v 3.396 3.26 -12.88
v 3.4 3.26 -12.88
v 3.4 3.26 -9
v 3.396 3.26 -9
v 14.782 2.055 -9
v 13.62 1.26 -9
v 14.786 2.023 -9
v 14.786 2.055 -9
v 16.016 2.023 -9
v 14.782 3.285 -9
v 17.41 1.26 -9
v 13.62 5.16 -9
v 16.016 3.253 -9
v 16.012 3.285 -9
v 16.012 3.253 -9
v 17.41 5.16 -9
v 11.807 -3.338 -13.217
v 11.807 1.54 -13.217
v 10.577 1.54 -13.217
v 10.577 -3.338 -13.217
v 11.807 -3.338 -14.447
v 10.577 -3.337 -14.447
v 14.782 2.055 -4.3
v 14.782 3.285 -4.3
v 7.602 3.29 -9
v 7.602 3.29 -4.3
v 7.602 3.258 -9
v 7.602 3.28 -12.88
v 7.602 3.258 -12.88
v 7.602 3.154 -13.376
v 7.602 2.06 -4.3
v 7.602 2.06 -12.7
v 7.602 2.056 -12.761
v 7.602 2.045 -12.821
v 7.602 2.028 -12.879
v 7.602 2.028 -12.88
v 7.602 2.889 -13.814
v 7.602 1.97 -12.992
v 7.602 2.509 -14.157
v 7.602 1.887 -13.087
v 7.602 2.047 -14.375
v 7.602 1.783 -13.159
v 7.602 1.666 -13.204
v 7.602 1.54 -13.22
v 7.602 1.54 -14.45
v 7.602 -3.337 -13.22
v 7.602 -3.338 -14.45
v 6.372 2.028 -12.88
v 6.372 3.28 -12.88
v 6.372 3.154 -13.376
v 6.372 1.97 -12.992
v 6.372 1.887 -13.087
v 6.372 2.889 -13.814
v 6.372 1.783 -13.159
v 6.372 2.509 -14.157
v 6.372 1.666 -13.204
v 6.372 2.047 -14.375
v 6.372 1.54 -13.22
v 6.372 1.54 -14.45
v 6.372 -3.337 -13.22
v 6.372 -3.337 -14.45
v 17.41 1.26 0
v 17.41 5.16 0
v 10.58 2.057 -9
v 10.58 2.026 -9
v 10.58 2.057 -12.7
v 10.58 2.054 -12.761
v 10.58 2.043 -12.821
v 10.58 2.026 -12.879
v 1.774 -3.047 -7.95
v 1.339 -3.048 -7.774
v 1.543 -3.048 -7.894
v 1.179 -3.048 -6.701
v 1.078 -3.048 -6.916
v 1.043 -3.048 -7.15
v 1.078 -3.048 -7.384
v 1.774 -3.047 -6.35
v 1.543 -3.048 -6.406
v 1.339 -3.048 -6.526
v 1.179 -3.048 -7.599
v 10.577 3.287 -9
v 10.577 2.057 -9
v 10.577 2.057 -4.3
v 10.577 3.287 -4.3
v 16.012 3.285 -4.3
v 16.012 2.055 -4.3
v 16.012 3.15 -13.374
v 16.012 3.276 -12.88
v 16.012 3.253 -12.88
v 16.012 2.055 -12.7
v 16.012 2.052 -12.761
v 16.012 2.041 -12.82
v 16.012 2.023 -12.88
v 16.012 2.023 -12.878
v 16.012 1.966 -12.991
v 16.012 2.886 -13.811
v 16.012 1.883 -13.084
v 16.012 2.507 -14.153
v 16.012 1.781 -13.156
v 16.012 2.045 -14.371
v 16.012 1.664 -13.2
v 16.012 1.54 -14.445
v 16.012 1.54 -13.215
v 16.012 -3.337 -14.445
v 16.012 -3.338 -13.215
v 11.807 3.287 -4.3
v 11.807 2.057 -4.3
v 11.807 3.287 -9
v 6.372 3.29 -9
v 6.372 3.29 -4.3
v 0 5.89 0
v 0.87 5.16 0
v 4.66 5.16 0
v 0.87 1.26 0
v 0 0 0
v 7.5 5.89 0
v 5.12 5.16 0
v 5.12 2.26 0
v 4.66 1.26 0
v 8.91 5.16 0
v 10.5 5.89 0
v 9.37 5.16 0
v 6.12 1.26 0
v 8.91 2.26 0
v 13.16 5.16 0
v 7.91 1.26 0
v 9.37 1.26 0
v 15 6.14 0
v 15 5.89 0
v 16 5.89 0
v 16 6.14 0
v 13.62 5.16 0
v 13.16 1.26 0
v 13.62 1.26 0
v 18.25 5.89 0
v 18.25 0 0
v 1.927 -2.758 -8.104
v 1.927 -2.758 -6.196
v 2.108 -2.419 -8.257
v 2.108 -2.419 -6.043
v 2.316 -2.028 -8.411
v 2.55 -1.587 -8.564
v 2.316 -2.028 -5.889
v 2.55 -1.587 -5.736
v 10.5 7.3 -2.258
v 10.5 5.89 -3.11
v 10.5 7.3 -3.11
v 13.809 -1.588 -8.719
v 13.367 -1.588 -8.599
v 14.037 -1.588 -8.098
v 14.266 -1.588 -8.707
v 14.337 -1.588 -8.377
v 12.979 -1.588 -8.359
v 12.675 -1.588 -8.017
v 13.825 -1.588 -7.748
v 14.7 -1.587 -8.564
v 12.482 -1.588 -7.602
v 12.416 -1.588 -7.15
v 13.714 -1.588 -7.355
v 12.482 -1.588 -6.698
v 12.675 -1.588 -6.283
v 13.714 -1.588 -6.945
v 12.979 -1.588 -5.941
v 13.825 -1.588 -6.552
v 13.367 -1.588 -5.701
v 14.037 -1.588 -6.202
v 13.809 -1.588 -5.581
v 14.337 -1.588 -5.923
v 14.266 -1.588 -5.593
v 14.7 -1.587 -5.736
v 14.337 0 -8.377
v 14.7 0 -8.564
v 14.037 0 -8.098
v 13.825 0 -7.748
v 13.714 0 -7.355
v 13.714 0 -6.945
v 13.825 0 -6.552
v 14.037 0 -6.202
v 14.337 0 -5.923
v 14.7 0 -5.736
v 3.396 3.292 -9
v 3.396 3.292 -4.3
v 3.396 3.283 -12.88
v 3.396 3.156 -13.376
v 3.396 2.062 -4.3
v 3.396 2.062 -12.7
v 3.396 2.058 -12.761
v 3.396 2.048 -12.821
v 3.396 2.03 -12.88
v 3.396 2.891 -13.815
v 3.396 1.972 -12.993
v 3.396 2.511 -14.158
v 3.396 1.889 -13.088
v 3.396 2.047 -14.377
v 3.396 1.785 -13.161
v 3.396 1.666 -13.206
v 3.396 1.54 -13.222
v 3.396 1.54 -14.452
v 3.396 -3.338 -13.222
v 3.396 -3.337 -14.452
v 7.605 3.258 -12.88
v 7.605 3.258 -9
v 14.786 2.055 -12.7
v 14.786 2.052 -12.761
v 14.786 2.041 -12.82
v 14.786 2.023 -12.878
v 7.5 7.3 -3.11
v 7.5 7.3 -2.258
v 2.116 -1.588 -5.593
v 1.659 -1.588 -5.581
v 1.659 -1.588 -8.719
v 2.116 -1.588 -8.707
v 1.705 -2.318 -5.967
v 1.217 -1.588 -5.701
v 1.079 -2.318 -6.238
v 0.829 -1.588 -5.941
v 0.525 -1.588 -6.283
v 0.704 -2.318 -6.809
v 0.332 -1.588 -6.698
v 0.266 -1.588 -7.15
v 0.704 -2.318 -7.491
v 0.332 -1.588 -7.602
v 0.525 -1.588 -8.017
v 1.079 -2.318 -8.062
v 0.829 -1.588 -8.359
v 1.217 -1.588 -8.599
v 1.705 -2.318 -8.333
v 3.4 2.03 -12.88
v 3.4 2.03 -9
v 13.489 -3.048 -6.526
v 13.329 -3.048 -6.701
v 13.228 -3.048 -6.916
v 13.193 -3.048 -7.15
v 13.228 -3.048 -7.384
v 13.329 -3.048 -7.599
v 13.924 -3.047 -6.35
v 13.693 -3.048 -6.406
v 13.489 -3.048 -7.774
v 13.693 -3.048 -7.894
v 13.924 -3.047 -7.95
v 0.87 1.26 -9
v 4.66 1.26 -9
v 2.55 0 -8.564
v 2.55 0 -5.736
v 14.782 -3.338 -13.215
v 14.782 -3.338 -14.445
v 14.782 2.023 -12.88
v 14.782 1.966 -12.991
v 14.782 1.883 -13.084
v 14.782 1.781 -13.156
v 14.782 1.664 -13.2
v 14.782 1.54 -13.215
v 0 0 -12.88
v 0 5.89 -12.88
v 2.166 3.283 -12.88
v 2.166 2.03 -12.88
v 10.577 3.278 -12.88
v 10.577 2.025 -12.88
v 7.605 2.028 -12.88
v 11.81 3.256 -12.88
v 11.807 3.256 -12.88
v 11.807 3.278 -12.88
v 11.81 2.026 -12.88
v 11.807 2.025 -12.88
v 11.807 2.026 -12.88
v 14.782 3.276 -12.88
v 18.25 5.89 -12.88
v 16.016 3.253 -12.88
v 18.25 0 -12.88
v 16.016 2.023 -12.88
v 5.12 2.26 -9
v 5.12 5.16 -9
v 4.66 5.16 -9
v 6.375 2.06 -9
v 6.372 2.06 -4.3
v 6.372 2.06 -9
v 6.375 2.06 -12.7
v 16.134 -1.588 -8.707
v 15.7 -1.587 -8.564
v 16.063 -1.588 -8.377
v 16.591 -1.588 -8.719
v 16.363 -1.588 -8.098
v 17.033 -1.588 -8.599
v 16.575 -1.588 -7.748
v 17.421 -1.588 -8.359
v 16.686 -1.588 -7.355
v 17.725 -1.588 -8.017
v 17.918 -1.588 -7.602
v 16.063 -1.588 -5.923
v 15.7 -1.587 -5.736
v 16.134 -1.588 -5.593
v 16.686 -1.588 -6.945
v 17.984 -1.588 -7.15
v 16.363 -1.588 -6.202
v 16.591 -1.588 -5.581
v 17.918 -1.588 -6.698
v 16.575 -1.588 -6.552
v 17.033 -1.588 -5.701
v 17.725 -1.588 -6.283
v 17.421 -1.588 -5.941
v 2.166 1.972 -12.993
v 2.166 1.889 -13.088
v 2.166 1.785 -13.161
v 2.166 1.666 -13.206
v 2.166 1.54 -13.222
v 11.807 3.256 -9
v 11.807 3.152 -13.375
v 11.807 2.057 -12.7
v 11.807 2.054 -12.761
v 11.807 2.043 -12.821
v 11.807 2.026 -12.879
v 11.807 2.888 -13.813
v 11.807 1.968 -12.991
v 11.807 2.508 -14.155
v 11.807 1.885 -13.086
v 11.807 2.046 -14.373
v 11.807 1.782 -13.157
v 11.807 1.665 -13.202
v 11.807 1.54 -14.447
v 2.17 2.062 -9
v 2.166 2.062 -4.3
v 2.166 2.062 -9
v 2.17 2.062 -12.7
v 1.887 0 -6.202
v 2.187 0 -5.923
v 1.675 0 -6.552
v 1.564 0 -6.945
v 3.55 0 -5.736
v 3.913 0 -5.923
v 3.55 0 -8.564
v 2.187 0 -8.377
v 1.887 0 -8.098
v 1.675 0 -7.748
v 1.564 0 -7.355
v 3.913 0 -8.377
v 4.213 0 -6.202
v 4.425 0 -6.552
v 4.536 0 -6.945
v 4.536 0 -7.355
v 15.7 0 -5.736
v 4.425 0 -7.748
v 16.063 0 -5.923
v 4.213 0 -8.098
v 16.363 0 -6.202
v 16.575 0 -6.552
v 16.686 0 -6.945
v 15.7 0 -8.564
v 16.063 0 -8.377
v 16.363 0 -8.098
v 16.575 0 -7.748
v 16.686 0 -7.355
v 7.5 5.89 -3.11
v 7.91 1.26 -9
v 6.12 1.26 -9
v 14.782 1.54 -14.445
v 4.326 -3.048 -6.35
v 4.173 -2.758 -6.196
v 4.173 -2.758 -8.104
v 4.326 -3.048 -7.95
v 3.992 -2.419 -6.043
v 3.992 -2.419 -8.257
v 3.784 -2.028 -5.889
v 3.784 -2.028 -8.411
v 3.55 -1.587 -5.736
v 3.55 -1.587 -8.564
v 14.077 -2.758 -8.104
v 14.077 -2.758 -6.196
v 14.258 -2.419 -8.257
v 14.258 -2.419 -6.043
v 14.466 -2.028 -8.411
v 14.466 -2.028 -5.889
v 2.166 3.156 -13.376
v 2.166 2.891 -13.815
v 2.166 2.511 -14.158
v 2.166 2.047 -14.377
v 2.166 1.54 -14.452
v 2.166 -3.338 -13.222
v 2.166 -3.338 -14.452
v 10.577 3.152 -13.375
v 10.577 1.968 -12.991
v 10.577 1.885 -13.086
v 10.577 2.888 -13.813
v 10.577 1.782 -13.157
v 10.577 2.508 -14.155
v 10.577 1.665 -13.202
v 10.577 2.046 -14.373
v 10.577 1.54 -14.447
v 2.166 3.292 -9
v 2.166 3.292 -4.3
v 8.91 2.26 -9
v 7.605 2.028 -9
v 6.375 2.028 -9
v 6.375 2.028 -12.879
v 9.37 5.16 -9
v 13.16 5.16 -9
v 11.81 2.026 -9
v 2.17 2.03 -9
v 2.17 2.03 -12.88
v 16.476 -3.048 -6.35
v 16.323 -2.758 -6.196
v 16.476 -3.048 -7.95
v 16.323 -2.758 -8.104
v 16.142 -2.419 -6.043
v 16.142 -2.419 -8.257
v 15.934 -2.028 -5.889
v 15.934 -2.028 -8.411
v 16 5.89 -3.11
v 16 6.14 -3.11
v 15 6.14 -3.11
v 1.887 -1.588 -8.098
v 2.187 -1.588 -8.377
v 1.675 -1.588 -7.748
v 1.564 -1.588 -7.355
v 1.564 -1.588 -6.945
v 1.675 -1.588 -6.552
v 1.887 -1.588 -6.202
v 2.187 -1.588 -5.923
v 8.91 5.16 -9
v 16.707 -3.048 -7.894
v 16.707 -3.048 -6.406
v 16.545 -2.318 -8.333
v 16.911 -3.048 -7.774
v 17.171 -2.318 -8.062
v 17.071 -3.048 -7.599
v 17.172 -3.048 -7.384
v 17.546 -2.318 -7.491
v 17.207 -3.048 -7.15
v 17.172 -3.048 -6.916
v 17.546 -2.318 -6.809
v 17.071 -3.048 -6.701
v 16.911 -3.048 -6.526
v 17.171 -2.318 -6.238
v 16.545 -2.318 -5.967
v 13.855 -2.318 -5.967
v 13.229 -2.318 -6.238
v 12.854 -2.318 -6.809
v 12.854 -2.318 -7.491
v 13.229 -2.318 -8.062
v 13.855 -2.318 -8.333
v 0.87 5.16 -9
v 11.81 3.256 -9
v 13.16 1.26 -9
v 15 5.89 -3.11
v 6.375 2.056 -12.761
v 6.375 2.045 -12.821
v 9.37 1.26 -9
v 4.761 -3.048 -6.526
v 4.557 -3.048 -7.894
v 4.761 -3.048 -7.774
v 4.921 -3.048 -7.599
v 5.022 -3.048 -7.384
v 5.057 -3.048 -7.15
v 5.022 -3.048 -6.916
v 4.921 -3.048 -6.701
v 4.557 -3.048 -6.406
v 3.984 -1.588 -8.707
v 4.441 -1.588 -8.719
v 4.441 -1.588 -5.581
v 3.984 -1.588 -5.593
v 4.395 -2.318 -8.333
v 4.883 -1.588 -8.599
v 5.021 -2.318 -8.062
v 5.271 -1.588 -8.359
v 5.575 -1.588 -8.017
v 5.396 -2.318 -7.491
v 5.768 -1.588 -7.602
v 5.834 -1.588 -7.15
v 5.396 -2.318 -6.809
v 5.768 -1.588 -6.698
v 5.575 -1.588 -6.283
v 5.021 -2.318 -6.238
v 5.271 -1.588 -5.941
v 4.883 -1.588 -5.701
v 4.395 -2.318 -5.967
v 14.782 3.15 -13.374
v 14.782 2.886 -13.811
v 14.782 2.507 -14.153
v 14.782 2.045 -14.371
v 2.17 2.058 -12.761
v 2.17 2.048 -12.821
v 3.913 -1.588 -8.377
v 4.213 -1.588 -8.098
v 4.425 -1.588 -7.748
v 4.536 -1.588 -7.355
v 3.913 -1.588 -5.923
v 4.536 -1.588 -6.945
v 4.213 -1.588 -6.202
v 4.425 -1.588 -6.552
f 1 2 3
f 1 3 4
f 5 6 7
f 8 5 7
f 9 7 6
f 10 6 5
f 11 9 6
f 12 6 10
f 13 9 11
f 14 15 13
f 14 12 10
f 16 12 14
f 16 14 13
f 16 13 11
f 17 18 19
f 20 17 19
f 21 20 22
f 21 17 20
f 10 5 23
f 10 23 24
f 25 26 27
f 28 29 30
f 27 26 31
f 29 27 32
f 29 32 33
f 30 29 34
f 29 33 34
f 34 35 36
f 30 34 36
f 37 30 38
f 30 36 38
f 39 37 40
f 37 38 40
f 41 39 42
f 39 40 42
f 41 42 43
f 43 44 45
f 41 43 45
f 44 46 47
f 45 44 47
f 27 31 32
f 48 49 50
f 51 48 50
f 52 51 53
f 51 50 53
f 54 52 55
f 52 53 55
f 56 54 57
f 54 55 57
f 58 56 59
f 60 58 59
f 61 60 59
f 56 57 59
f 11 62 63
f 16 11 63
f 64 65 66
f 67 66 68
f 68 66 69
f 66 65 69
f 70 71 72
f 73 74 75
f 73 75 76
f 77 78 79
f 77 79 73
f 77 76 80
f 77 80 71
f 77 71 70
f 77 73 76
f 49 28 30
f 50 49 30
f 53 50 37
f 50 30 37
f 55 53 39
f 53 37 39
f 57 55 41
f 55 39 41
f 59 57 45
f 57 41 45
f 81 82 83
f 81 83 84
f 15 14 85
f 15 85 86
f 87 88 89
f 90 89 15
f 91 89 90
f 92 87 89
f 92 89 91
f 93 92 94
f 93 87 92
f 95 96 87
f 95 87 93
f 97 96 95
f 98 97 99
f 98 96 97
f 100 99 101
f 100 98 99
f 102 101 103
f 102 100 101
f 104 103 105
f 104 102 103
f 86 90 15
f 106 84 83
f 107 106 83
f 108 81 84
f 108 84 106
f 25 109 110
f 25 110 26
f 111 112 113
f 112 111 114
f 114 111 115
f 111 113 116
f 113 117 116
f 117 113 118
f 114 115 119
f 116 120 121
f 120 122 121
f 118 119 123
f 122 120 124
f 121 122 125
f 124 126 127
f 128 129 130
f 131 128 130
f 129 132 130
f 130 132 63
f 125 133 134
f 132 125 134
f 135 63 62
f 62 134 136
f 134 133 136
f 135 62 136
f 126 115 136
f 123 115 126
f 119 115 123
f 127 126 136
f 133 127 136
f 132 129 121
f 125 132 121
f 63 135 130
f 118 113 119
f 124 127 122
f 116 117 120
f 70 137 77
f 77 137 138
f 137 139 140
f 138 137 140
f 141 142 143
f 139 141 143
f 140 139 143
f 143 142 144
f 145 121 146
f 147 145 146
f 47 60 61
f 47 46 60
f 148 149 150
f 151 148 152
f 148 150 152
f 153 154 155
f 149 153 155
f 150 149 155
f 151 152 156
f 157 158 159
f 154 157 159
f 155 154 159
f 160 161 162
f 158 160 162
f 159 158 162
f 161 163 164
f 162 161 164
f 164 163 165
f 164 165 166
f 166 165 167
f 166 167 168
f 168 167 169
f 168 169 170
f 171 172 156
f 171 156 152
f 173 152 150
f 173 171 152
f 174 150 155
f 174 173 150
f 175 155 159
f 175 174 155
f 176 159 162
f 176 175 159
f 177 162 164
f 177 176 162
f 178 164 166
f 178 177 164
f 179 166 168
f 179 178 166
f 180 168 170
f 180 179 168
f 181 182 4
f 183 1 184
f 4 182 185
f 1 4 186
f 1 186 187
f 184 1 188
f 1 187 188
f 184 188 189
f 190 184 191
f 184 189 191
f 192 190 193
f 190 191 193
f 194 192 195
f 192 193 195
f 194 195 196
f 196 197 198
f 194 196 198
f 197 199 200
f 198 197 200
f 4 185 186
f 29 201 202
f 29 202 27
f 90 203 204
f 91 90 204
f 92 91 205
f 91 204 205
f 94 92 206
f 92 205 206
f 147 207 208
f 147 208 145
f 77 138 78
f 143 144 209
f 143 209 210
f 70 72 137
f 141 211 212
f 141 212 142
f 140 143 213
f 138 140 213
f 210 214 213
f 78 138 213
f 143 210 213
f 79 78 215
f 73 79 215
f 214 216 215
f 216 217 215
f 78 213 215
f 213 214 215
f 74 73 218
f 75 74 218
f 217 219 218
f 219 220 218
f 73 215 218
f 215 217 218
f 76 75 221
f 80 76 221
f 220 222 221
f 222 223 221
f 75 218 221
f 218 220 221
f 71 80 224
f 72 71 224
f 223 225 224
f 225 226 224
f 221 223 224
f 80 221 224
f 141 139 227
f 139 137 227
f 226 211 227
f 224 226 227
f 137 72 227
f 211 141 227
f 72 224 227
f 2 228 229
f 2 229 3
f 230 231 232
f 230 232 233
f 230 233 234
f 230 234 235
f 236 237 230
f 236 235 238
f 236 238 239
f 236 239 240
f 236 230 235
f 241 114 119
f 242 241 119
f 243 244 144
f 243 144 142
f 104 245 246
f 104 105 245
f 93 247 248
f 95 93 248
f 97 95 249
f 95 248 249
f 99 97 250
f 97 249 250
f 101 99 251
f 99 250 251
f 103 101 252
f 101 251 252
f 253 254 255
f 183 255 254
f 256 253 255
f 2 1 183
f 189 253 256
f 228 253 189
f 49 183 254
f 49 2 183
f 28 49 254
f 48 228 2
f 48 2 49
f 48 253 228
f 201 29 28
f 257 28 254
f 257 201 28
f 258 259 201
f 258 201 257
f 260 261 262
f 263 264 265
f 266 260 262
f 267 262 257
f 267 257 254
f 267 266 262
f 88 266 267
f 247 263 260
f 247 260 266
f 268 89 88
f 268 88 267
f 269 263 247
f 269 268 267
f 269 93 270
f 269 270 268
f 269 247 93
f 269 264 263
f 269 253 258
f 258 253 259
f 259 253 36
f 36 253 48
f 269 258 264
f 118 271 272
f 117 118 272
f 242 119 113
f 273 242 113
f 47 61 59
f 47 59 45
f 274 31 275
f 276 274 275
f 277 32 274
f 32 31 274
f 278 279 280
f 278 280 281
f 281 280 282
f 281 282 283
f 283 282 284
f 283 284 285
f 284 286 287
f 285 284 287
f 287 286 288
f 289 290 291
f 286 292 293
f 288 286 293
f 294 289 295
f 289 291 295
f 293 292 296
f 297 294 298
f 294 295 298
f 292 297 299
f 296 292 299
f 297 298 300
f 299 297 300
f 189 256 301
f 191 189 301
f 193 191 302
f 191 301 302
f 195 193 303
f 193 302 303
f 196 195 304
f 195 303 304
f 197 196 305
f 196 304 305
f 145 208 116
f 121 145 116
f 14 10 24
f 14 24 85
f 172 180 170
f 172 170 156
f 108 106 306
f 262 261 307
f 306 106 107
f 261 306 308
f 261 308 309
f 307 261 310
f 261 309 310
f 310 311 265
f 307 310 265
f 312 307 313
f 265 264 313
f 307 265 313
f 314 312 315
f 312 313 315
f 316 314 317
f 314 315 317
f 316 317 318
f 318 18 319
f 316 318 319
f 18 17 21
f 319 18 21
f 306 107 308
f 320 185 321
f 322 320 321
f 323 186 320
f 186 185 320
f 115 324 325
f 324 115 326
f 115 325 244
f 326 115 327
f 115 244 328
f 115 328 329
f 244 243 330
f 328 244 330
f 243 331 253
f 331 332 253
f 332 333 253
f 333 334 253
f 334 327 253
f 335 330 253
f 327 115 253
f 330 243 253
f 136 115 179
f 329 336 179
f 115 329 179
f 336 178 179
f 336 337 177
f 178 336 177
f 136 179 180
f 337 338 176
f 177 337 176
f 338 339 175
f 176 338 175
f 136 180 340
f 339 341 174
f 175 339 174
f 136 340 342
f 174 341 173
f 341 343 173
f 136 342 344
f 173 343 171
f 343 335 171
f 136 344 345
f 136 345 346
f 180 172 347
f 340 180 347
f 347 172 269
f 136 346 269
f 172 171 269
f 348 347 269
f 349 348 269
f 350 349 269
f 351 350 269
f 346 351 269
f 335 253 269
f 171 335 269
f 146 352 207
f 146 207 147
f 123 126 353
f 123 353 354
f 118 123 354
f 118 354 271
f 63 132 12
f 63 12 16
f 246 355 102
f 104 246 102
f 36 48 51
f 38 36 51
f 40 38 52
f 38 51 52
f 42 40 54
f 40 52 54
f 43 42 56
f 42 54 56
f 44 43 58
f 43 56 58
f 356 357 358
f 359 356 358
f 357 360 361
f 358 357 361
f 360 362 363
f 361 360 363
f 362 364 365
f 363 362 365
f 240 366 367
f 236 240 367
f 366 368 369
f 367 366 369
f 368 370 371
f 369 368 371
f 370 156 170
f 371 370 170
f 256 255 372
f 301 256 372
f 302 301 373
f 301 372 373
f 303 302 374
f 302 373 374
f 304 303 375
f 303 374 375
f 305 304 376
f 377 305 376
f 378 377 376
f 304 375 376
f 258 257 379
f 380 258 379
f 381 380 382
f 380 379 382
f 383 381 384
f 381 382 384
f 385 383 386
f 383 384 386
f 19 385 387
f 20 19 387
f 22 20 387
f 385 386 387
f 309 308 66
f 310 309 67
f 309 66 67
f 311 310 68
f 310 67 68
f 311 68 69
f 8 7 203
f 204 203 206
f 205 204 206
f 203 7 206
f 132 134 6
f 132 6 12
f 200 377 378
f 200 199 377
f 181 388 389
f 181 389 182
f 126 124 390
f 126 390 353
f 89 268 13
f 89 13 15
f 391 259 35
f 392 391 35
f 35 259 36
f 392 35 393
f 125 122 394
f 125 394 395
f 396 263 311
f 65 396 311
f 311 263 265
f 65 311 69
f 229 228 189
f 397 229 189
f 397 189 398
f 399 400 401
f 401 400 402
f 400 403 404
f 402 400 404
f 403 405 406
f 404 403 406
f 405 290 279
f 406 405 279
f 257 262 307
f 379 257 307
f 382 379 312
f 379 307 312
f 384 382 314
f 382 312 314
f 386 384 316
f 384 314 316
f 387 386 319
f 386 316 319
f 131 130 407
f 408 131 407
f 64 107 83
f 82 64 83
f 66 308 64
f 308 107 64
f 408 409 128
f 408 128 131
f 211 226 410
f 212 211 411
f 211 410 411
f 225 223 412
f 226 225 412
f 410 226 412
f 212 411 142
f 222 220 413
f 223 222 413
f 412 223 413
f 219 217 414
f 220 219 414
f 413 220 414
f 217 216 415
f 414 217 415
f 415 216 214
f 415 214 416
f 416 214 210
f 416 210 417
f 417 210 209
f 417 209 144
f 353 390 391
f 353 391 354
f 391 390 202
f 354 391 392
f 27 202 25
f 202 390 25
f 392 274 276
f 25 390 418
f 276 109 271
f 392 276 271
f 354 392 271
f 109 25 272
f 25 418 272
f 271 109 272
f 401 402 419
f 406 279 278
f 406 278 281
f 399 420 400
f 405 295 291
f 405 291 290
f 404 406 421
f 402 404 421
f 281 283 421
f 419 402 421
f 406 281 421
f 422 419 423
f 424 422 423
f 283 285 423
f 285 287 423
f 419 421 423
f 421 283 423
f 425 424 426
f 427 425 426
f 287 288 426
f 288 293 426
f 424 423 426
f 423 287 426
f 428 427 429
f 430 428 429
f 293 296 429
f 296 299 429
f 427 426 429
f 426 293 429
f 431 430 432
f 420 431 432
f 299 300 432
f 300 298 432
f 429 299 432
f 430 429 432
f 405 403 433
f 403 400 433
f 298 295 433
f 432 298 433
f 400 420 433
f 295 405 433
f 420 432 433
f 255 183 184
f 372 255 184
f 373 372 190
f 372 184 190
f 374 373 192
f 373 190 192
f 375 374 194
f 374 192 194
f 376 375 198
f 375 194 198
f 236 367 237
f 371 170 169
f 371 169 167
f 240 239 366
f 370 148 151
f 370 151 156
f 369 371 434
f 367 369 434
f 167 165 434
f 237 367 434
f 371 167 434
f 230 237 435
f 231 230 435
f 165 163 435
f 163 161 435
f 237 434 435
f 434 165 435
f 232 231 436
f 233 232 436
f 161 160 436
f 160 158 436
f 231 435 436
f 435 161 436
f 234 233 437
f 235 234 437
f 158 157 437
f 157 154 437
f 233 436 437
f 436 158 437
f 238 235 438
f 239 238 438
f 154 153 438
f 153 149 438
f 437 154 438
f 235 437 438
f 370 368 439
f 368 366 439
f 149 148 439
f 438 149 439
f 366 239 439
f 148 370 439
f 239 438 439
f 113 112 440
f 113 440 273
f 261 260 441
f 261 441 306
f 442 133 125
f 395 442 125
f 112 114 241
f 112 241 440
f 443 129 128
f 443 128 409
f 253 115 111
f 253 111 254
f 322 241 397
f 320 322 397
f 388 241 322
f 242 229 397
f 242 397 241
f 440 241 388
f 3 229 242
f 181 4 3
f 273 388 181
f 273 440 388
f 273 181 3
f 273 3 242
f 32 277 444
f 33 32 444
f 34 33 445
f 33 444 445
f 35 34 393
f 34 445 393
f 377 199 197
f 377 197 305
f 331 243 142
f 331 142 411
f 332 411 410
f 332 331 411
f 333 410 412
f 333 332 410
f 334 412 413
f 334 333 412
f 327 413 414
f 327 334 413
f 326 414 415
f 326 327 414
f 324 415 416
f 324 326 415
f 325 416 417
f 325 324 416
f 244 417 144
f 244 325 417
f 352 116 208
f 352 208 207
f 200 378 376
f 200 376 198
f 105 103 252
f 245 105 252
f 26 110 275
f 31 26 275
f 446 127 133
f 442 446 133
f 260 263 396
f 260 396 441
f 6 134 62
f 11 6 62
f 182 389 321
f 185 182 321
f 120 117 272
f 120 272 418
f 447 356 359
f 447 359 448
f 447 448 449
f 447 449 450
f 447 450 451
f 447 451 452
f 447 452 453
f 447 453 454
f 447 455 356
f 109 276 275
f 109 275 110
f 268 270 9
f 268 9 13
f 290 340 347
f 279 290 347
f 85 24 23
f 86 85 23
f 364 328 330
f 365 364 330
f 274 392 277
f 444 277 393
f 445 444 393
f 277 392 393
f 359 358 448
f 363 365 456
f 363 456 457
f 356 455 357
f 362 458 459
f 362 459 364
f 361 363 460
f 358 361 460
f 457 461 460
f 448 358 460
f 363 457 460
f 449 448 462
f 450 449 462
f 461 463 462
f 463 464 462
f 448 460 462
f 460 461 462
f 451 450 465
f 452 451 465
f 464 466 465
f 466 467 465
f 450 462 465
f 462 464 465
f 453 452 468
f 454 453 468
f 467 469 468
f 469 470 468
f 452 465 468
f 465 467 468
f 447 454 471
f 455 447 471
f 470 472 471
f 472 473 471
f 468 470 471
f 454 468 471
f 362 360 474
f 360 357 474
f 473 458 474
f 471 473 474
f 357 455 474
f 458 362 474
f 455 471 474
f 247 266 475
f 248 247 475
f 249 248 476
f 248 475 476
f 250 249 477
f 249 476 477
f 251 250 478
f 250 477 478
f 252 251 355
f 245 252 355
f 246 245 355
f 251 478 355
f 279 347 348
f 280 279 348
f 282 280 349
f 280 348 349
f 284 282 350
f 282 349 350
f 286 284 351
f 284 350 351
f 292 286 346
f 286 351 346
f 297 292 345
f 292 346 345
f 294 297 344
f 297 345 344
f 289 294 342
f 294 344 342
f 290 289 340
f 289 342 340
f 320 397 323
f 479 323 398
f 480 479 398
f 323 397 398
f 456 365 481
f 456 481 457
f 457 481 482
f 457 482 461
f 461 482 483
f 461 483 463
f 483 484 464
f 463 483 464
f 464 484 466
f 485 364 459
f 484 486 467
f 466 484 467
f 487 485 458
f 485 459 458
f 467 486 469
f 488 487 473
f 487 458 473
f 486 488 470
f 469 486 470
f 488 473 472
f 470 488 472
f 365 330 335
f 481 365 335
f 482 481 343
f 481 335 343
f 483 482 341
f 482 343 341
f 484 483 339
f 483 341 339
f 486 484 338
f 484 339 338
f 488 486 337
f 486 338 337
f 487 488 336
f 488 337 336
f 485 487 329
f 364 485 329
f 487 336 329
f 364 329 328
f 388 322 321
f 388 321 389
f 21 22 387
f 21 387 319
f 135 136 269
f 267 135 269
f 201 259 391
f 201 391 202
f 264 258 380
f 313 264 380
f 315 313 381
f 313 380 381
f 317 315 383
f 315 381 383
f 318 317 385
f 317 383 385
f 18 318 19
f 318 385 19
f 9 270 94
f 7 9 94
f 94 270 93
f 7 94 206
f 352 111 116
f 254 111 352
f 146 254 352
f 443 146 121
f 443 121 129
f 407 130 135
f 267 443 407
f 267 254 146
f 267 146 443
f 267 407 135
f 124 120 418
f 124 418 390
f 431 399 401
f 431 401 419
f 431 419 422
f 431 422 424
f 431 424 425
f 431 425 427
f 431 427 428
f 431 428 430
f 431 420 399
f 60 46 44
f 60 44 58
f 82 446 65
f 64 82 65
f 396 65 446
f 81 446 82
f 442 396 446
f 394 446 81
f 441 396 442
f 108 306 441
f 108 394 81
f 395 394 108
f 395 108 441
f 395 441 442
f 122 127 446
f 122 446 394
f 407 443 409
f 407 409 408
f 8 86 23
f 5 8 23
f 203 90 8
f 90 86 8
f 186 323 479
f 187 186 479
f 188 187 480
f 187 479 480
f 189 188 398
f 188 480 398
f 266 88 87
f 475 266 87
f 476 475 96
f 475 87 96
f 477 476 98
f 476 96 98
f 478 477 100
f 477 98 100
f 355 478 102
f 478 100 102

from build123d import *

# Parameters (mm, degrees)
SKETCH1_W                     = 18.25
SKETCH1_H                     = 12.88
BOSS_EXTRUDE1_DEPTH           = 5.89
SKETCH2_W                     = 3.79
SKETCH2_H                     = 3.9
CUT_EXTRUDE1_DEPTH            = 9
SKETCH3_W                     = 3
SKETCH3_H                     = 3.11
BOSS_EXTRUDE2_DEPTH           = 1.41
CUT_EXTRUDE2_DEPTH            = 3
SKETCH5_W                     = 1.23
SKETCH5_H                     = 1.23
CUT_EXTRUDE3_DEPTH            = 4
SKETCH8_W                     = 1.23
SKETCH8_H                     = 1.23
SKETCH9_W                     = 1
SKETCH9_H                     = 3.11
BOSS_EXTRUDE3_DEPTH           = 0.25
BOSS_EXTRUDE5_DEPTH           = 1.5875
BOSS_EXTRUDE6_DEPTH           = 1.46
BOSS_EXTRUDE6_DRAFT           = 28
BOSS_EXTRUDE6_PROFILE_2_DEPTH = 1.46
BOSS_EXTRUDE6_PROFILE_2_DRAFT = 28
BOSS_EXTRUDE6_PROFILE_3_DEPTH = 1.46
BOSS_EXTRUDE6_PROFILE_3_DRAFT = 28
BOSS_EXTRUDE6_PROFILE_4_DEPTH = 1.46
BOSS_EXTRUDE6_PROFILE_4_DRAFT = 28


with BuildPart() as part:
    # Sketch1 → Boss-Extrude1 (new body)
    with BuildSketch(Plane(origin=(0, 0, 0), x_dir=(1, 0, 0), z_dir=(0, 1, 0))):
        with Locations((9.125, 6.44)):
            Rectangle(SKETCH1_W, SKETCH1_H)
    extrude(amount=BOSS_EXTRUDE1_DEPTH)

    # Sketch2 → Cut-Extrude1 (cut)
    with BuildSketch(Plane.XY):
        with Locations((2.765, 3.21048567)):
            Rectangle(SKETCH2_W, SKETCH2_H)
        Polygon((5.12, 5.16048567), (8.91, 5.16048567), (8.91, 2.26048567), (7.91, 1.26048567), (6.12, 1.26048567), (5.12, 2.26048567), align=None)
        with Locations((11.265, 3.21048567)):
            Rectangle(SKETCH2_W, SKETCH2_H)
        with Locations((15.515, 3.21048567)):
            Rectangle(SKETCH2_W, SKETCH2_H)
    extrude(amount=-CUT_EXTRUDE1_DEPTH, mode=Mode.SUBTRACT)

    # Sketch3 → Boss-Extrude2 (add)
    with BuildSketch(Plane(origin=(0, 5.89, 0), x_dir=(1, 0, 0), z_dir=(0, 1, 0))):
        with Locations((9, 1.555)):
            Rectangle(SKETCH3_W, SKETCH3_H)
    extrude(amount=BOSS_EXTRUDE2_DEPTH)

    # Sketch4 → Cut-Extrude2 (cut)
    with BuildSketch(Plane.ZY.offset(-7.5)):
        Polygon((-2.258367839, 7.3), (0, 5.89), (0, 7.3), align=None)
    extrude(amount=-CUT_EXTRUDE2_DEPTH, mode=Mode.SUBTRACT)

    # Sketch5 → Cut-Extrude3 (cut)
    with BuildSketch(Plane(origin=(0, 0, -12.88), x_dir=(-1, 0, 0), z_dir=(0, 0, -1))):
        with Locations((-2.785, 2.645)):
            Rectangle(SKETCH5_W, SKETCH5_H)
        with Locations((-6.990239219, 2.642823938)):
            Rectangle(SKETCH5_W, SKETCH5_H)
        with Locations((-11.195478439, 2.640647876)):
            Rectangle(SKETCH5_W, SKETCH5_H)
        with Locations((-15.400717658, 2.638471814)):
            Rectangle(SKETCH5_W, SKETCH5_H)
    extrude(amount=-CUT_EXTRUDE3_DEPTH, mode=Mode.SUBTRACT)

    # Sweep2: sweep along a path in Sketch7
    with BuildLine(Plane.ZY) as sweep2_path:
        Line((-4.3, 2.72), (-12.700459496, 2.72))
        ThreePointArc((-12.700459496, 2.72), (-13.534520585, 2.374520585), (-13.88, 1.540459496))
        Line((-13.88, 1.540459496), (-13.88, -3.3375))
    # Sketch8 → Sweep2 (sweep)
    with BuildSketch(Plane.XZ.offset(3.3375)):
        with Locations((15.397064507, -13.830209109)):
            Rectangle(SKETCH8_W, SKETCH8_H)
        with Locations((11.191825288, -13.832385171)):
            Rectangle(SKETCH8_W, SKETCH8_H)
        with Locations((6.986586068, -13.834561233)):
            Rectangle(SKETCH8_W, SKETCH8_H)
        with Locations((2.781346849, -13.836737294)):
            Rectangle(SKETCH8_W, SKETCH8_H)
    sweep(path=sweep2_path.line)

    # Sketch9 → Boss-Extrude3 (add)
    with BuildSketch(Plane(origin=(0, 5.89, 0), x_dir=(1, 0, 0), z_dir=(0, 1, 0))):
        with Locations((15.5, 1.555)):
            Rectangle(SKETCH9_W, SKETCH9_H)
    extrude(amount=BOSS_EXTRUDE3_DEPTH)

    # Sketch10 → Boss-Extrude5 (add)
    with BuildSketch(Plane.XZ):
        with BuildLine():
            Line((2.55, -5.735786438), (2.55, -8.564213562))
            ThreePointArc((2.55, -8.564213562), (1.55, -7.15), (2.55, -5.735786438))
        make_face()
        with BuildLine():
            Line((3.55, -5.735786438), (3.55, -8.564213562))
            ThreePointArc((3.55, -8.564213562), (4.55, -7.15), (3.55, -5.735786438))
        make_face()
        with BuildLine():
            Line((14.7, -5.735786438), (14.7, -8.564213562))
            ThreePointArc((14.7, -8.564213562), (13.7, -7.15), (14.7, -5.735786438))
        make_face()
        with BuildLine():
            Line((15.7, -5.735786438), (15.7, -8.564213562))
            ThreePointArc((15.7, -8.564213562), (16.7, -7.15), (15.7, -5.735786438))
        make_face()
    extrude(amount=BOSS_EXTRUDE5_DEPTH)


with BuildPart() as boss_extrude6_tool:
    # Sketch12 → Boss-Extrude6 (with draft: the straight prism first)
    with BuildSketch(Plane.XZ.offset(1.5875)):
        with BuildLine():
            ThreePointArc((2.55, -5.735786438), (0.266263579, -7.15), (2.55, -8.564213562))
            Line((2.55, -8.564213562), (2.55, -5.735786438))
        make_face()
    extrude(amount=BOSS_EXTRUDE6_DEPTH)
    # Boss-Extrude6: the draft: its side faces are tilted about the plane it starts from
    boss_extrude6_sides = [boss_extrude6_tool.faces().sort_by_distance(p)[0] for p in [
        (2.55, -2.3175, -7.15),
        (0.266263579, -2.3175, -7.15),
    ]]
    draft(boss_extrude6_sides, Plane.XZ.offset(1.5875), BOSS_EXTRUDE6_DRAFT)


with BuildPart() as part_1:
    add(part.part)

    # Boss-Extrude6: add boss_extrude6_tool
    add(boss_extrude6_tool.part)


with BuildPart() as boss_extrude6_profile_2_tool:
    # Sketch12 → Boss-Extrude6 profile 2 (with draft: the straight prism first)
    with BuildSketch(Plane.XZ.offset(1.5875)):
        with BuildLine():
            Line((3.55, -5.735786438), (3.55, -8.564213562))
            ThreePointArc((3.55, -8.564213562), (5.833736421, -7.15), (3.55, -5.735786438))
        make_face()
    extrude(amount=BOSS_EXTRUDE6_PROFILE_2_DEPTH)
    # Boss-Extrude6 profile 2: the draft: its side faces are tilted about the plane it starts from
    boss_extrude6_profile_2_sides = [boss_extrude6_profile_2_tool.faces().sort_by_distance(p)[0] for p in [
        (3.55, -2.3175, -7.15),
        (5.833736421, -2.3175, -7.15),
    ]]
    draft(boss_extrude6_profile_2_sides, Plane.XZ.offset(1.5875), BOSS_EXTRUDE6_PROFILE_2_DRAFT)


with BuildPart() as part_2:
    add(part_1.part)

    # Boss-Extrude6 profile 2: add boss_extrude6_profile_2_tool
    add(boss_extrude6_profile_2_tool.part)


with BuildPart() as boss_extrude6_profile_3_tool:
    # Sketch12 → Boss-Extrude6 profile 3 (with draft: the straight prism first)
    with BuildSketch(Plane.XZ.offset(1.5875)):
        with BuildLine():
            ThreePointArc((14.7, -5.735786438), (12.416263579, -7.15), (14.7, -8.564213562))
            Line((14.7, -8.564213562), (14.7, -5.735786438))
        make_face()
    extrude(amount=BOSS_EXTRUDE6_PROFILE_3_DEPTH)
    # Boss-Extrude6 profile 3: the draft: its side faces are tilted about the plane it starts from
    boss_extrude6_profile_3_sides = [boss_extrude6_profile_3_tool.faces().sort_by_distance(p)[0] for p in [
        (12.416263579, -2.3175, -7.15),
        (14.7, -2.3175, -7.15),
    ]]
    draft(boss_extrude6_profile_3_sides, Plane.XZ.offset(1.5875), BOSS_EXTRUDE6_PROFILE_3_DRAFT)


with BuildPart() as part_3:
    add(part_2.part)

    # Boss-Extrude6 profile 3: add boss_extrude6_profile_3_tool
    add(boss_extrude6_profile_3_tool.part)


with BuildPart() as boss_extrude6_profile_4_tool:
    # Sketch12 → Boss-Extrude6 profile 4 (with draft: the straight prism first)
    with BuildSketch(Plane.XZ.offset(1.5875)):
        with BuildLine():
            Line((15.7, -5.735786438), (15.7, -8.564213562))
            ThreePointArc((15.7, -8.564213562), (17.983736421, -7.15), (15.7, -5.735786438))
        make_face()
    extrude(amount=BOSS_EXTRUDE6_PROFILE_4_DEPTH)
    # Boss-Extrude6 profile 4: the draft: its side faces are tilted about the plane it starts from
    boss_extrude6_profile_4_sides = [boss_extrude6_profile_4_tool.faces().sort_by_distance(p)[0] for p in [
        (15.7, -2.3175, -7.15),
        (17.983736421, -2.3175, -7.15),
    ]]
    draft(boss_extrude6_profile_4_sides, Plane.XZ.offset(1.5875), BOSS_EXTRUDE6_PROFILE_4_DRAFT)


with BuildPart() as part_4:
    add(part_3.part)

    # Boss-Extrude6 profile 4: add boss_extrude6_profile_4_tool
    add(boss_extrude6_profile_4_tool.part)


solid = part_4.part
